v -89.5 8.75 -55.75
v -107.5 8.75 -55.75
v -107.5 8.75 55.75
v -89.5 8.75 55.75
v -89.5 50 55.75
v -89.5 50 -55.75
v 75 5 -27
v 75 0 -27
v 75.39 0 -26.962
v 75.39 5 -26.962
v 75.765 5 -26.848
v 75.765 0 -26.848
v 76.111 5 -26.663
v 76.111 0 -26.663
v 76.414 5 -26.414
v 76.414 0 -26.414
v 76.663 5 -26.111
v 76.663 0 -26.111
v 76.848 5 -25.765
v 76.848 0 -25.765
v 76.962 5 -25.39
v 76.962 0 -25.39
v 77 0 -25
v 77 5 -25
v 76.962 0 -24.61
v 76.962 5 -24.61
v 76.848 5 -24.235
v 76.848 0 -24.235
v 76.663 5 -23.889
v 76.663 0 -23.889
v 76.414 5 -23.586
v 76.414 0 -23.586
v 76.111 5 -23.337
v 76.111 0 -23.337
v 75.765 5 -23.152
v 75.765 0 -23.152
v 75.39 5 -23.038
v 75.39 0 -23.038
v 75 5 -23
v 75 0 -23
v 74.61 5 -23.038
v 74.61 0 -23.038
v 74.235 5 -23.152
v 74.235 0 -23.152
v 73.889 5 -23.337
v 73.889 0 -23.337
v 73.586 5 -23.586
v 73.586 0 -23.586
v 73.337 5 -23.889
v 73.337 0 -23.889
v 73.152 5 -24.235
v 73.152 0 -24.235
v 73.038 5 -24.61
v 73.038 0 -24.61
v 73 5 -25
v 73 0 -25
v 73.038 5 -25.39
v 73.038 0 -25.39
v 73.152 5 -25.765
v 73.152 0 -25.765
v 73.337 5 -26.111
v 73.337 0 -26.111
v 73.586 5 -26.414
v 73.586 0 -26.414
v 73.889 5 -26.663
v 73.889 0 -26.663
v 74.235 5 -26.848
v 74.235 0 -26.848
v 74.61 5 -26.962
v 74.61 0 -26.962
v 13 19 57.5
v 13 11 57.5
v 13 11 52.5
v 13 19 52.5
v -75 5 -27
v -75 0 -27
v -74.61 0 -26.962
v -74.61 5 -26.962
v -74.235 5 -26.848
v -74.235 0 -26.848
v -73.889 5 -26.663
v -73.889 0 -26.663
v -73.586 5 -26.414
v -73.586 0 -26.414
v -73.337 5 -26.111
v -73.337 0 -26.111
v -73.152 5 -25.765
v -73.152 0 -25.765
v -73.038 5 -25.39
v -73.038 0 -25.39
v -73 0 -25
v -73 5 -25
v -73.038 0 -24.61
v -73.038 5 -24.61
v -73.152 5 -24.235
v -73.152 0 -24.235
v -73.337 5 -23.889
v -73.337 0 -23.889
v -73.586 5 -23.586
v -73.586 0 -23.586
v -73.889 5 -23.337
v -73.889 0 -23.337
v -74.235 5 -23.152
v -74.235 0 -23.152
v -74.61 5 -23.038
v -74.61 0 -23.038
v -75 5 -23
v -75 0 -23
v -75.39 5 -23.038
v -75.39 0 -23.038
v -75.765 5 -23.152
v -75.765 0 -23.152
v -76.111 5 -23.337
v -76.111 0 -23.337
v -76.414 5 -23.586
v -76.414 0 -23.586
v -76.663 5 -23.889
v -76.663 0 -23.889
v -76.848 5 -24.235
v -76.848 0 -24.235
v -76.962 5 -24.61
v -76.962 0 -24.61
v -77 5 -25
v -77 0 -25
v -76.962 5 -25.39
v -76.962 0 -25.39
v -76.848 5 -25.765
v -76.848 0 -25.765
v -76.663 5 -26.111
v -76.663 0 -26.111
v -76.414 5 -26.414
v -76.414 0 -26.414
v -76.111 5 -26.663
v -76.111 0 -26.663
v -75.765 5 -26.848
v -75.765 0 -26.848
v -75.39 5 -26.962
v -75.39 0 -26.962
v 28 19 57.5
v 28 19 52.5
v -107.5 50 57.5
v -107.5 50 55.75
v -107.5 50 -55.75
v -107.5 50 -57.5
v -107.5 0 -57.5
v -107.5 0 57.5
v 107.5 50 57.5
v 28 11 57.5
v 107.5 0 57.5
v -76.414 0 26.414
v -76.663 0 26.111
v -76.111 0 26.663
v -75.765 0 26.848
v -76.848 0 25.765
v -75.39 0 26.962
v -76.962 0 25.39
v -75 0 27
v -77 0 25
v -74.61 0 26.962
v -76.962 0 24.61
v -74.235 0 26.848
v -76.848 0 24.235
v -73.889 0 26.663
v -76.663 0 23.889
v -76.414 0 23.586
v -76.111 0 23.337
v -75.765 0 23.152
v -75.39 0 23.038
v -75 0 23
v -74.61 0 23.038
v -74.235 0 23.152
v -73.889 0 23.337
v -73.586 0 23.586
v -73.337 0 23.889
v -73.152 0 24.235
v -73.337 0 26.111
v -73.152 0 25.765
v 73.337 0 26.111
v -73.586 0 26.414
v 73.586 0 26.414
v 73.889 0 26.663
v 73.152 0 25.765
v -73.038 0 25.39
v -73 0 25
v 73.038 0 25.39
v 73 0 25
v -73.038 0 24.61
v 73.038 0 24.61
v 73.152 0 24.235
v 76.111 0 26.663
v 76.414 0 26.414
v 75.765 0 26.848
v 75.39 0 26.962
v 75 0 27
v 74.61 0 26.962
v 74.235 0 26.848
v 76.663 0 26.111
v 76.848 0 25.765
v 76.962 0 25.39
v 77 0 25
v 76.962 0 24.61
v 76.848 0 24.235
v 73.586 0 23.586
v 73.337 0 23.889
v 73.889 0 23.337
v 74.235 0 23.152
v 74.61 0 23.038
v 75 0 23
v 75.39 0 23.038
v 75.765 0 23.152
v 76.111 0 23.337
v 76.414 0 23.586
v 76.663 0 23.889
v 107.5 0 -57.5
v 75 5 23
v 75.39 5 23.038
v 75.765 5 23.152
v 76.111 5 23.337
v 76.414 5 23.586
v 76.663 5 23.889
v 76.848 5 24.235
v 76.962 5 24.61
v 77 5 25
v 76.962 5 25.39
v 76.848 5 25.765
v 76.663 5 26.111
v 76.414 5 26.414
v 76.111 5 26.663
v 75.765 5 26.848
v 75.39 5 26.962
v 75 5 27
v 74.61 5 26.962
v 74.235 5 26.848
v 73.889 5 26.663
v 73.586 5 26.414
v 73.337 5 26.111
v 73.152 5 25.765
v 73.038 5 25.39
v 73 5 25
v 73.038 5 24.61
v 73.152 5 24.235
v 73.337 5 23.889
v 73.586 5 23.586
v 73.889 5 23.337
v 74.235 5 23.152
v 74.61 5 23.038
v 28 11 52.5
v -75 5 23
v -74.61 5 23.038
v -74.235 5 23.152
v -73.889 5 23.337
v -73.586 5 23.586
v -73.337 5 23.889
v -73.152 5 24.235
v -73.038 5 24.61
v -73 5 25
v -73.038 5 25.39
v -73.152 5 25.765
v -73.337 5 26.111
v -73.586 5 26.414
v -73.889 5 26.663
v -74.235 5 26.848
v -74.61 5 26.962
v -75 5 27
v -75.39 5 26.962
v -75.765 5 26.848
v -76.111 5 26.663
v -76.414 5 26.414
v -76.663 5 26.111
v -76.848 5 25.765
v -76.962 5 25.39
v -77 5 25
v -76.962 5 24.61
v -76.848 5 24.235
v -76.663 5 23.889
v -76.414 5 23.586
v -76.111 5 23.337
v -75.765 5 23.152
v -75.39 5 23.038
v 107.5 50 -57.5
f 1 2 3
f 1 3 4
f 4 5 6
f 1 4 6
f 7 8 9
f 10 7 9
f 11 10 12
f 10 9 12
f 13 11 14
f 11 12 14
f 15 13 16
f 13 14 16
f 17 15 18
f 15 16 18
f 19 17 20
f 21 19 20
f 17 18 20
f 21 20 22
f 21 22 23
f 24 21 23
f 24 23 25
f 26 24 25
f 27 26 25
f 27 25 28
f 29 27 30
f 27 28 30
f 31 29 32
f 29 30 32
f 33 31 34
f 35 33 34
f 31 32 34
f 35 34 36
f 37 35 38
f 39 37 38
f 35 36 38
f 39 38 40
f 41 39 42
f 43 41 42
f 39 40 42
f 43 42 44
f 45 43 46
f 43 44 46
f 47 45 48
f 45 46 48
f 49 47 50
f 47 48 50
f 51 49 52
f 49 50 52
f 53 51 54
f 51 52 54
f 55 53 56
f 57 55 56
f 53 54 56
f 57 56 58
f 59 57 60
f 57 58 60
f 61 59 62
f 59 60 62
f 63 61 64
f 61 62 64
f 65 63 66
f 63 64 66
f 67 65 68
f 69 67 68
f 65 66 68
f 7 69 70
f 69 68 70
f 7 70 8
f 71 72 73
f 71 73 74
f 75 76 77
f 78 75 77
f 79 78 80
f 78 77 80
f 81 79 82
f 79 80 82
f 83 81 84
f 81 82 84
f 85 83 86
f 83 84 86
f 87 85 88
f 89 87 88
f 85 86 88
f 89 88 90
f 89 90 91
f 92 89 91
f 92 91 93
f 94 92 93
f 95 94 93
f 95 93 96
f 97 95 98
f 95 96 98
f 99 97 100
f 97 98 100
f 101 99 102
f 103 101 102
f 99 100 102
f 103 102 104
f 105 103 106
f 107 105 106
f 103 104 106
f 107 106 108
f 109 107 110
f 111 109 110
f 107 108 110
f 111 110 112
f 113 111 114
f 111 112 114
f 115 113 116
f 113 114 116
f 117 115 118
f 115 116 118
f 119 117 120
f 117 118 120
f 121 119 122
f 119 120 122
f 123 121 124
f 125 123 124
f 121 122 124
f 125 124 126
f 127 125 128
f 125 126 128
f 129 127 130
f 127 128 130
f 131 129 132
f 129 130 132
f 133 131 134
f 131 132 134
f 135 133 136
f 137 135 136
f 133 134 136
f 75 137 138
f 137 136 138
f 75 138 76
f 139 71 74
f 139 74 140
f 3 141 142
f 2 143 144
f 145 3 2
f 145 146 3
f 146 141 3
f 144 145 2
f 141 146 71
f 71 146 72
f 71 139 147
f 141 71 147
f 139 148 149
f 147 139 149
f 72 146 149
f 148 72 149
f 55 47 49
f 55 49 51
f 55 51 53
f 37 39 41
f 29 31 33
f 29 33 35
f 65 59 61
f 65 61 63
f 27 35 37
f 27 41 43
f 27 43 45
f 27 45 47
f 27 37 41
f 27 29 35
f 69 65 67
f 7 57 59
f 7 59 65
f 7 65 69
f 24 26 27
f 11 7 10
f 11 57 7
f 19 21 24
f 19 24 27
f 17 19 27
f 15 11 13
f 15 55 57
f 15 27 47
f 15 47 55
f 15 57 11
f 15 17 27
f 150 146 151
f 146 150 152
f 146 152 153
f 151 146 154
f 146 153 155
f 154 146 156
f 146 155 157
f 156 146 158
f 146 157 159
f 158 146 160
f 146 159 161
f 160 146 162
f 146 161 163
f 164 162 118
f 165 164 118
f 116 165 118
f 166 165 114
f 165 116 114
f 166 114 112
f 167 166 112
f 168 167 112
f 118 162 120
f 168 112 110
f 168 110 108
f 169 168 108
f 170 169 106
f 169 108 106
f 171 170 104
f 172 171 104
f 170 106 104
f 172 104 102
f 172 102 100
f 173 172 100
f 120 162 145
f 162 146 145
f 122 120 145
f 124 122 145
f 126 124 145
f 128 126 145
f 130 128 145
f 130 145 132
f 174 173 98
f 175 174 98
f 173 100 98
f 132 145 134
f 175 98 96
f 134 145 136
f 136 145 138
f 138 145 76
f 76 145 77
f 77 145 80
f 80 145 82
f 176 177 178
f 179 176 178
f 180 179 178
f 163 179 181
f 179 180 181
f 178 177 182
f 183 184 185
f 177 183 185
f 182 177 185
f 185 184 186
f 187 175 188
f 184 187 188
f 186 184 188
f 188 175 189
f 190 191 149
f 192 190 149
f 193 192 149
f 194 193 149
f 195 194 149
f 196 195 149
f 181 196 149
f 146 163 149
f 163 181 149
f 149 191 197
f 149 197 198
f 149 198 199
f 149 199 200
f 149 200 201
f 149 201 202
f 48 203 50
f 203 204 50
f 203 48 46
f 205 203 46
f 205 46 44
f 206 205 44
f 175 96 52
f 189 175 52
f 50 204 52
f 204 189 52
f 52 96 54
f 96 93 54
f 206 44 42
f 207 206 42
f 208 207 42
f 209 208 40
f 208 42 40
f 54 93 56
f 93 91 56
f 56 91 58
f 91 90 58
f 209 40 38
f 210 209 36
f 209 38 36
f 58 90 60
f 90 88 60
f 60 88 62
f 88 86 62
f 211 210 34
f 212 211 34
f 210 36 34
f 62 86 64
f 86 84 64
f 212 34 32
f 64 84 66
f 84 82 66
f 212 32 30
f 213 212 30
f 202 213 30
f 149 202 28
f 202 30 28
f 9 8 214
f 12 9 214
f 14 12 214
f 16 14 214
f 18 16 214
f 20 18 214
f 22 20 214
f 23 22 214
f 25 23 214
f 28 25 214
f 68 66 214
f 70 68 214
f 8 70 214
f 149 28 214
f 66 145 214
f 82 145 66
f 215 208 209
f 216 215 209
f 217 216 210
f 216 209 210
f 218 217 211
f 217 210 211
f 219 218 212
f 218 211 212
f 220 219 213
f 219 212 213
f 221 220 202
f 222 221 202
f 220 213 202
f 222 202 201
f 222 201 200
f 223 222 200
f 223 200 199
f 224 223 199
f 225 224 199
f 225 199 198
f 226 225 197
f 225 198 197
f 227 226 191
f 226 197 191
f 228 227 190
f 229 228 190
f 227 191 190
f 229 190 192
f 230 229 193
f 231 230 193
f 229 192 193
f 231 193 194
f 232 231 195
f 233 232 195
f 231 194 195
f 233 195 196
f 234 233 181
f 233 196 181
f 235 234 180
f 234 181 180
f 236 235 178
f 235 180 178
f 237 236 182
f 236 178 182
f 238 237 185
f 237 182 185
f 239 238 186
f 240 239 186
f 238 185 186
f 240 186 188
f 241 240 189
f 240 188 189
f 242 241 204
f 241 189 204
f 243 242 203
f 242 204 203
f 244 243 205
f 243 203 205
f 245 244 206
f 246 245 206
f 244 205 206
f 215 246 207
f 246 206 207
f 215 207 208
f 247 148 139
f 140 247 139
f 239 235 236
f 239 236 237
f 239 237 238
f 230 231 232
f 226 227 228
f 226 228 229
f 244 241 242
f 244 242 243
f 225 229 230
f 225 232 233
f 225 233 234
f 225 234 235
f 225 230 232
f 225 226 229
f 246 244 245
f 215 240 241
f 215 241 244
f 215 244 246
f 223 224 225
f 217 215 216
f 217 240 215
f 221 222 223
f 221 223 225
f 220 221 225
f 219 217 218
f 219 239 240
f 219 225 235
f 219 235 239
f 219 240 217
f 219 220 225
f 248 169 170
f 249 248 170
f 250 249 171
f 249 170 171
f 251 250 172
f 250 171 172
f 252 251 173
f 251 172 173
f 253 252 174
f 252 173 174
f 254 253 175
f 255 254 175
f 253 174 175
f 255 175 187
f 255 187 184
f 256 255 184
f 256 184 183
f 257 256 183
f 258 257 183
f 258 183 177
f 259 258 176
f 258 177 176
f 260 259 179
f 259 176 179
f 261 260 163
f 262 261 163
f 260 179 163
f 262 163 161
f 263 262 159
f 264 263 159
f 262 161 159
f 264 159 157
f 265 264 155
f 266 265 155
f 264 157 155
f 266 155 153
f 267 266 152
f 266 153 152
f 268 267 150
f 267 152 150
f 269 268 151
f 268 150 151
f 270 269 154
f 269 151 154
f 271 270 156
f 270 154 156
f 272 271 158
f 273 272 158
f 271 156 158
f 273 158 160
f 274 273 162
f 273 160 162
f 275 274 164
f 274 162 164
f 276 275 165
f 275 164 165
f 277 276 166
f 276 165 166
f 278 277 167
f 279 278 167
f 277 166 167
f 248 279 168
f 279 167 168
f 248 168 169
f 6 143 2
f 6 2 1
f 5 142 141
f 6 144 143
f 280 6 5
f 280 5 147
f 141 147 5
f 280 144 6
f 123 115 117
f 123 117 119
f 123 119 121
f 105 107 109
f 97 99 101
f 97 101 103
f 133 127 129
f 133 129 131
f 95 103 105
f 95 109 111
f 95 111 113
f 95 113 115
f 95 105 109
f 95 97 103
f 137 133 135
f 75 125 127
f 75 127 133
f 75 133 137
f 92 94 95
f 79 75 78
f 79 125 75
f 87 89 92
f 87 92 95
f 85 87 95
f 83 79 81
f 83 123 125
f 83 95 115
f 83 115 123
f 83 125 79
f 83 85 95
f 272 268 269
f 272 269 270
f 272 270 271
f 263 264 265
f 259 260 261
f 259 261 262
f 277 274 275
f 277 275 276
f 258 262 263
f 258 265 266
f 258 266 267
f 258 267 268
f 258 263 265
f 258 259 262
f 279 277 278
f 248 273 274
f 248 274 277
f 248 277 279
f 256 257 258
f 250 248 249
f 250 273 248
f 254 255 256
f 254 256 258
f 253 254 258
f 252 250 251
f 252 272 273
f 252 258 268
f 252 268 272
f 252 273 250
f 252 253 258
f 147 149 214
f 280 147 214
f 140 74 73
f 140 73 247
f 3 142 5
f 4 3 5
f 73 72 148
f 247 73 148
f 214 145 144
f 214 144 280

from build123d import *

# Parameters (mm, degrees)
SKETCH1_W           = 215
SKETCH1_H           = 115
BOSS_EXTRUDE1_DEPTH = 50
SKETCH2_W           = 18
SKETCH2_H           = 111.5
CUT_EXTRUDE1_DEPTH  = 41.25
SKETCH3_R           = 2
CUT_EXTRUDE2_DEPTH  = 5
SKETCH4_W           = 15
SKETCH4_H           = 8
CUT_EXTRUDE3_DEPTH  = 5


with BuildPart() as part:
    # Sketch1 → Boss-Extrude1 (new body)
    with BuildSketch(Plane(origin=(0, 0, 0), x_dir=(1, 0, 0), z_dir=(0, 1, 0))):
        Rectangle(SKETCH1_W, SKETCH1_H)
    extrude(amount=BOSS_EXTRUDE1_DEPTH)

    # Sketch2 → Cut-Extrude1 (cut)
    with BuildSketch(Plane(origin=(0, 50, 0), x_dir=(1, 0, 0), z_dir=(0, 1, 0))):
        with Locations((-98.5, 0)):
            Rectangle(SKETCH2_W, SKETCH2_H)
    extrude(amount=-CUT_EXTRUDE1_DEPTH, mode=Mode.SUBTRACT)

    # Sketch3 → Cut-Extrude2 (cut)
    with BuildSketch(Plane.XZ):
        with Locations(Location((-75, -25, 0), (0, 0, 270))):  # turned: the seam where the file's is
            Circle(SKETCH3_R)
        with Locations(Location((-75, 25, 0), (0, 0, 270))):  # turned: the seam where the file's is
            Circle(SKETCH3_R)
        with Locations(Location((75, -25, 0), (0, 0, 270))):  # turned: the seam where the file's is
            Circle(SKETCH3_R)
        with Locations(Location((75, 25, 0), (0, 0, 270))):  # turned: the seam where the file's is
            Circle(SKETCH3_R)
    extrude(amount=-CUT_EXTRUDE2_DEPTH, mode=Mode.SUBTRACT)

    # Sketch4 → Cut-Extrude3 (cut)
    with BuildSketch(Plane.XY.offset(57.5)):
        with Locations((20.5, 15)):
            Rectangle(SKETCH4_W, SKETCH4_H)
    extrude(amount=-CUT_EXTRUDE3_DEPTH, mode=Mode.SUBTRACT)


solid = part.part
